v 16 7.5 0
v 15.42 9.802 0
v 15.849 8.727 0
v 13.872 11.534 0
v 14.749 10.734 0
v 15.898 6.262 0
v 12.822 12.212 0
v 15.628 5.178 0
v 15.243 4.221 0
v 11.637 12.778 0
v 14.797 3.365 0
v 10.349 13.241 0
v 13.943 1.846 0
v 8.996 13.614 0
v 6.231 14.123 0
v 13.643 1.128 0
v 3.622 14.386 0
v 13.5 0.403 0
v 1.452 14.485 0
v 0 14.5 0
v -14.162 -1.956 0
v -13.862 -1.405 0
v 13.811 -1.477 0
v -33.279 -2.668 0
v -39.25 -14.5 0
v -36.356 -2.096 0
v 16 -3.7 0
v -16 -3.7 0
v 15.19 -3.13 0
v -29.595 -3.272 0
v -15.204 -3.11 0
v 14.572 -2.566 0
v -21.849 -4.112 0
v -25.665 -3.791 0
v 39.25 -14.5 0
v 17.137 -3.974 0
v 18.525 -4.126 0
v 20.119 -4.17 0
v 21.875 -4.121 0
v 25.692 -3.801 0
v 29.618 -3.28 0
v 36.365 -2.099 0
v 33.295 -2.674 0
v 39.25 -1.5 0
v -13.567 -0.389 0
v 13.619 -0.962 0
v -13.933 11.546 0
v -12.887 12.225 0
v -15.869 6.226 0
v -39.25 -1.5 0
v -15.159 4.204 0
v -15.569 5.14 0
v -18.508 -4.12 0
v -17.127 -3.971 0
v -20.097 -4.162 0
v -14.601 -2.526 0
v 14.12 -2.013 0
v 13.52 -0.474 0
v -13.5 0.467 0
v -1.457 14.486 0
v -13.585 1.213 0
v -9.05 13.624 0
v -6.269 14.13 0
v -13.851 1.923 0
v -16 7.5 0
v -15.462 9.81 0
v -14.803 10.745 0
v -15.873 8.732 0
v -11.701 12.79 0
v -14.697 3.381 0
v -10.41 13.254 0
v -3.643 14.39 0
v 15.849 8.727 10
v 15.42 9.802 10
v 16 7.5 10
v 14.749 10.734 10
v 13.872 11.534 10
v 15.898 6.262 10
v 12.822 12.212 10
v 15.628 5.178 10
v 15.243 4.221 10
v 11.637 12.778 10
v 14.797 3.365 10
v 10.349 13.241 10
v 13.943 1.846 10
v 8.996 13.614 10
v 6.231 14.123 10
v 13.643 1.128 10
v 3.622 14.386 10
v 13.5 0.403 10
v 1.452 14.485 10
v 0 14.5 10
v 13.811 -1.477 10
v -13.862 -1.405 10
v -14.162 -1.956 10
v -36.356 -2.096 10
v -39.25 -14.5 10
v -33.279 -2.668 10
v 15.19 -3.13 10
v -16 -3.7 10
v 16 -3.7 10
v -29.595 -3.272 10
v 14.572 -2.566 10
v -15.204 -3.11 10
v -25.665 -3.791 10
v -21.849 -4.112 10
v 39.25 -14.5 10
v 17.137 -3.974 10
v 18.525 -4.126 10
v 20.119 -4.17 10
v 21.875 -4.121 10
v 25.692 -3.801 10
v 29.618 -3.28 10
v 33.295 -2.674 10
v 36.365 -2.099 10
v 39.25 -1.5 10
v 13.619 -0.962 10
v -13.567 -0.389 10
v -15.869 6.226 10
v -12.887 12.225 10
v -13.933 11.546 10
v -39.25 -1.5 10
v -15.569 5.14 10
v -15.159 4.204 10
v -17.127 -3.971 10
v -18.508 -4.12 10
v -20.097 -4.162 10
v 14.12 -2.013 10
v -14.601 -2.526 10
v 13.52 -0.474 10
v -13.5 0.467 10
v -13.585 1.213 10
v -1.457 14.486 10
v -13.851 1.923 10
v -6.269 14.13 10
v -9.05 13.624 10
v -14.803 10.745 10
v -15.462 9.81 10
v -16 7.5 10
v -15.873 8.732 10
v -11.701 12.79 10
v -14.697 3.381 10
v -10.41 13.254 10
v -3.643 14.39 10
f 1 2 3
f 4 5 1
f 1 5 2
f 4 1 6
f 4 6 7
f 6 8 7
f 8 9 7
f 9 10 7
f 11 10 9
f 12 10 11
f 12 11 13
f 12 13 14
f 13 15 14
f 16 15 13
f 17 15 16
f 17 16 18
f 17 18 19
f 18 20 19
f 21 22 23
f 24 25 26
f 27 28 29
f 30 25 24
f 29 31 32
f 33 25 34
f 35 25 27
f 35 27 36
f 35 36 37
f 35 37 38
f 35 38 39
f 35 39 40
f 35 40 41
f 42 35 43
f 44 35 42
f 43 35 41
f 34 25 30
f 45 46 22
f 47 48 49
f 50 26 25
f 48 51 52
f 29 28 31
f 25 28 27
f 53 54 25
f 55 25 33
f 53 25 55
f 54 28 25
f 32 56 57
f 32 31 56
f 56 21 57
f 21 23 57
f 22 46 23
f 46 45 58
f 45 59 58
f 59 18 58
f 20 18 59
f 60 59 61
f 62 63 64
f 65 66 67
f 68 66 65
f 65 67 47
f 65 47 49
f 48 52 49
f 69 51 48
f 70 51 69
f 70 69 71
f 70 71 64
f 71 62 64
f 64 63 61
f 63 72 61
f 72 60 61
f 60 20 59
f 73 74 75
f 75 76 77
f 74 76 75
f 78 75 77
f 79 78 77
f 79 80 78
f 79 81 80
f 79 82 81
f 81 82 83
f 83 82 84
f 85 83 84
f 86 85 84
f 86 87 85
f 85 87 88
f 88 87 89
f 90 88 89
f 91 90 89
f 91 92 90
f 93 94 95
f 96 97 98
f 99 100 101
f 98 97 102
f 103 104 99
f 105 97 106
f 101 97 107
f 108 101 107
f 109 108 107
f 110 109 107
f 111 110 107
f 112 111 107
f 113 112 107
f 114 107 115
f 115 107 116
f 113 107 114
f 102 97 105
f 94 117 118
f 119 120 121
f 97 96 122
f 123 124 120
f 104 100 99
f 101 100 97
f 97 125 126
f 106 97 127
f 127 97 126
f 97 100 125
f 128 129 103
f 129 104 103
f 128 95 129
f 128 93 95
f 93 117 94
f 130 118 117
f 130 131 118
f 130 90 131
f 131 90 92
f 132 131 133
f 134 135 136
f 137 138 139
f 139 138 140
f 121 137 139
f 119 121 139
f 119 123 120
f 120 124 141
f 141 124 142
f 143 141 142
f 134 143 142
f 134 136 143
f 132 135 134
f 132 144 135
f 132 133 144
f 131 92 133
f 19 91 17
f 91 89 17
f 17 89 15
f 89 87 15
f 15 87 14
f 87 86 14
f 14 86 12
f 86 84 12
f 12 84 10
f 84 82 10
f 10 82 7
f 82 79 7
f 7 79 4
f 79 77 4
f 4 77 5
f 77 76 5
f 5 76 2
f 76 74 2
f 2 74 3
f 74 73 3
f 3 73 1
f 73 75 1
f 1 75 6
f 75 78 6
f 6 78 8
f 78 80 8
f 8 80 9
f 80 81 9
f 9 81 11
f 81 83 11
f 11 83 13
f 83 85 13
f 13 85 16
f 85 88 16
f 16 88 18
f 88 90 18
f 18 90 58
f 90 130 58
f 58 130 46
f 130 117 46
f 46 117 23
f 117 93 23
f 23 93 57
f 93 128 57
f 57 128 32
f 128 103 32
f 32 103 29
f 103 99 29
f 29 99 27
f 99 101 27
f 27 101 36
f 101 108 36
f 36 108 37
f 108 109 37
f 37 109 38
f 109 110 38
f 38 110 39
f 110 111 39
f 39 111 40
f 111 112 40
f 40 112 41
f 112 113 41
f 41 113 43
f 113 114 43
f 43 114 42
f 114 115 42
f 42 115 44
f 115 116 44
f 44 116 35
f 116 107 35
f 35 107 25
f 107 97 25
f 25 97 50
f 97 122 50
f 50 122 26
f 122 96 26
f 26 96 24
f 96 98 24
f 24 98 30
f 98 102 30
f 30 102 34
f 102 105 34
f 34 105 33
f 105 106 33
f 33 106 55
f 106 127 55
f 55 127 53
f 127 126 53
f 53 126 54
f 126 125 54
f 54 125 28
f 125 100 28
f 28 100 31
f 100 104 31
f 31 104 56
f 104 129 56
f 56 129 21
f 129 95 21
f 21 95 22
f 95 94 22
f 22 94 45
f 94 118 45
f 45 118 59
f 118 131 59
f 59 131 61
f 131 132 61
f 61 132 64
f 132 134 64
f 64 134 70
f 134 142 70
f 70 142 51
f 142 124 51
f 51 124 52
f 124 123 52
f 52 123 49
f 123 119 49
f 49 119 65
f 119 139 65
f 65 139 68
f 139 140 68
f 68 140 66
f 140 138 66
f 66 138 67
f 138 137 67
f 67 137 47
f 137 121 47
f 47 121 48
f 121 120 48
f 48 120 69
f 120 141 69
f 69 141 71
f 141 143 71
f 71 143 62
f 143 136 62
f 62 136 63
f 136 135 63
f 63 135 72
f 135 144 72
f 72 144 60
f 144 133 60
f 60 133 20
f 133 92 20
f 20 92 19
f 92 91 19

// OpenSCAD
// Module names are of the form poly_<inkscape-path-id>().  As a result,
// you can associate a polygon in this OpenSCAD program with the corresponding
// SVG element in the Inkscape document by looking for the XML element with
// the attribute id="inkscape-path-id".

// fudge value is used to ensure that subtracted solids are a tad taller
// in the z dimension than the polygon being subtracted from.  This helps
// keep the resulting .stl file manifold.
fudge = 0.1;

module poly_path2995(h)
{
  scale([25.4/90, -25.4/90, 1]) union()
  {
    linear_extrude(height=h)
      polygon([[-139.074800,5.314975],[-139.074800,51.377975],[139.074800,51.377975],[139.074800,5.314975],[128.850808,7.436589],[117.973990,9.475701],[104.945665,11.622212],[91.034614,13.467519],[77.509617,14.603017],[71.288384,14.776900],[65.639457,14.620104],[60.721434,14.081554],[56.692913,13.110175],[53.823133,11.090559],[51.632466,9.092355],[50.033141,7.133776],[48.937386,5.233038],[48.257430,3.408354],[47.905502,1.677939],[47.834646,-1.427225],[48.339963,-3.997711],[49.402865,-6.540009],[52.430234,-11.923825],[54.009107,-14.957235],[55.374376,-18.346241],[56.333245,-22.186789],[56.692915,-26.574825],[56.156214,-30.922990],[54.637419,-34.730757],[52.261074,-38.033984],[49.151726,-40.868529],[45.433920,-43.270248],[41.232204,-45.275000],[36.671121,-46.918643],[31.875219,-48.237032],[22.077139,-50.041486],[12.834331,-50.975220],[5.143162,-51.325096],[0.000000,-51.377975],[-5.164312,-51.329326],[-12.906846,-50.989723],[-22.213104,-50.068678],[-32.068591,-48.275706],[-36.885265,-46.961471],[-41.458811,-45.320321],[-45.662416,-43.315947],[-49.369269,-40.912037],[-52.452557,-38.072280],[-54.785468,-34.760367],[-56.241191,-30.939985],[-56.692913,-26.574825],[-56.227725,-22.060295],[-55.164934,-18.211228],[-53.711615,-14.894797],[-52.074840,-11.978175],[-49.079216,-6.813047],[-48.134513,-4.298886],[-47.834646,-1.653225],[-48.072311,1.378464],[-49.117397,4.977013],[-50.182026,6.929131],[-51.735674,8.951292],[-53.874063,11.019604],[-56.692913,13.110175],[-60.686141,14.068815],[-65.577969,14.597910],[-71.208857,14.748195],[-77.419268,14.570406],[-90.940499,13.433549],[-104.865354,11.593225],[-117.917522,9.455320],[-128.820692,7.425719],[-139.074800,5.314975]]);
  }
}

poly_path2995(10);
